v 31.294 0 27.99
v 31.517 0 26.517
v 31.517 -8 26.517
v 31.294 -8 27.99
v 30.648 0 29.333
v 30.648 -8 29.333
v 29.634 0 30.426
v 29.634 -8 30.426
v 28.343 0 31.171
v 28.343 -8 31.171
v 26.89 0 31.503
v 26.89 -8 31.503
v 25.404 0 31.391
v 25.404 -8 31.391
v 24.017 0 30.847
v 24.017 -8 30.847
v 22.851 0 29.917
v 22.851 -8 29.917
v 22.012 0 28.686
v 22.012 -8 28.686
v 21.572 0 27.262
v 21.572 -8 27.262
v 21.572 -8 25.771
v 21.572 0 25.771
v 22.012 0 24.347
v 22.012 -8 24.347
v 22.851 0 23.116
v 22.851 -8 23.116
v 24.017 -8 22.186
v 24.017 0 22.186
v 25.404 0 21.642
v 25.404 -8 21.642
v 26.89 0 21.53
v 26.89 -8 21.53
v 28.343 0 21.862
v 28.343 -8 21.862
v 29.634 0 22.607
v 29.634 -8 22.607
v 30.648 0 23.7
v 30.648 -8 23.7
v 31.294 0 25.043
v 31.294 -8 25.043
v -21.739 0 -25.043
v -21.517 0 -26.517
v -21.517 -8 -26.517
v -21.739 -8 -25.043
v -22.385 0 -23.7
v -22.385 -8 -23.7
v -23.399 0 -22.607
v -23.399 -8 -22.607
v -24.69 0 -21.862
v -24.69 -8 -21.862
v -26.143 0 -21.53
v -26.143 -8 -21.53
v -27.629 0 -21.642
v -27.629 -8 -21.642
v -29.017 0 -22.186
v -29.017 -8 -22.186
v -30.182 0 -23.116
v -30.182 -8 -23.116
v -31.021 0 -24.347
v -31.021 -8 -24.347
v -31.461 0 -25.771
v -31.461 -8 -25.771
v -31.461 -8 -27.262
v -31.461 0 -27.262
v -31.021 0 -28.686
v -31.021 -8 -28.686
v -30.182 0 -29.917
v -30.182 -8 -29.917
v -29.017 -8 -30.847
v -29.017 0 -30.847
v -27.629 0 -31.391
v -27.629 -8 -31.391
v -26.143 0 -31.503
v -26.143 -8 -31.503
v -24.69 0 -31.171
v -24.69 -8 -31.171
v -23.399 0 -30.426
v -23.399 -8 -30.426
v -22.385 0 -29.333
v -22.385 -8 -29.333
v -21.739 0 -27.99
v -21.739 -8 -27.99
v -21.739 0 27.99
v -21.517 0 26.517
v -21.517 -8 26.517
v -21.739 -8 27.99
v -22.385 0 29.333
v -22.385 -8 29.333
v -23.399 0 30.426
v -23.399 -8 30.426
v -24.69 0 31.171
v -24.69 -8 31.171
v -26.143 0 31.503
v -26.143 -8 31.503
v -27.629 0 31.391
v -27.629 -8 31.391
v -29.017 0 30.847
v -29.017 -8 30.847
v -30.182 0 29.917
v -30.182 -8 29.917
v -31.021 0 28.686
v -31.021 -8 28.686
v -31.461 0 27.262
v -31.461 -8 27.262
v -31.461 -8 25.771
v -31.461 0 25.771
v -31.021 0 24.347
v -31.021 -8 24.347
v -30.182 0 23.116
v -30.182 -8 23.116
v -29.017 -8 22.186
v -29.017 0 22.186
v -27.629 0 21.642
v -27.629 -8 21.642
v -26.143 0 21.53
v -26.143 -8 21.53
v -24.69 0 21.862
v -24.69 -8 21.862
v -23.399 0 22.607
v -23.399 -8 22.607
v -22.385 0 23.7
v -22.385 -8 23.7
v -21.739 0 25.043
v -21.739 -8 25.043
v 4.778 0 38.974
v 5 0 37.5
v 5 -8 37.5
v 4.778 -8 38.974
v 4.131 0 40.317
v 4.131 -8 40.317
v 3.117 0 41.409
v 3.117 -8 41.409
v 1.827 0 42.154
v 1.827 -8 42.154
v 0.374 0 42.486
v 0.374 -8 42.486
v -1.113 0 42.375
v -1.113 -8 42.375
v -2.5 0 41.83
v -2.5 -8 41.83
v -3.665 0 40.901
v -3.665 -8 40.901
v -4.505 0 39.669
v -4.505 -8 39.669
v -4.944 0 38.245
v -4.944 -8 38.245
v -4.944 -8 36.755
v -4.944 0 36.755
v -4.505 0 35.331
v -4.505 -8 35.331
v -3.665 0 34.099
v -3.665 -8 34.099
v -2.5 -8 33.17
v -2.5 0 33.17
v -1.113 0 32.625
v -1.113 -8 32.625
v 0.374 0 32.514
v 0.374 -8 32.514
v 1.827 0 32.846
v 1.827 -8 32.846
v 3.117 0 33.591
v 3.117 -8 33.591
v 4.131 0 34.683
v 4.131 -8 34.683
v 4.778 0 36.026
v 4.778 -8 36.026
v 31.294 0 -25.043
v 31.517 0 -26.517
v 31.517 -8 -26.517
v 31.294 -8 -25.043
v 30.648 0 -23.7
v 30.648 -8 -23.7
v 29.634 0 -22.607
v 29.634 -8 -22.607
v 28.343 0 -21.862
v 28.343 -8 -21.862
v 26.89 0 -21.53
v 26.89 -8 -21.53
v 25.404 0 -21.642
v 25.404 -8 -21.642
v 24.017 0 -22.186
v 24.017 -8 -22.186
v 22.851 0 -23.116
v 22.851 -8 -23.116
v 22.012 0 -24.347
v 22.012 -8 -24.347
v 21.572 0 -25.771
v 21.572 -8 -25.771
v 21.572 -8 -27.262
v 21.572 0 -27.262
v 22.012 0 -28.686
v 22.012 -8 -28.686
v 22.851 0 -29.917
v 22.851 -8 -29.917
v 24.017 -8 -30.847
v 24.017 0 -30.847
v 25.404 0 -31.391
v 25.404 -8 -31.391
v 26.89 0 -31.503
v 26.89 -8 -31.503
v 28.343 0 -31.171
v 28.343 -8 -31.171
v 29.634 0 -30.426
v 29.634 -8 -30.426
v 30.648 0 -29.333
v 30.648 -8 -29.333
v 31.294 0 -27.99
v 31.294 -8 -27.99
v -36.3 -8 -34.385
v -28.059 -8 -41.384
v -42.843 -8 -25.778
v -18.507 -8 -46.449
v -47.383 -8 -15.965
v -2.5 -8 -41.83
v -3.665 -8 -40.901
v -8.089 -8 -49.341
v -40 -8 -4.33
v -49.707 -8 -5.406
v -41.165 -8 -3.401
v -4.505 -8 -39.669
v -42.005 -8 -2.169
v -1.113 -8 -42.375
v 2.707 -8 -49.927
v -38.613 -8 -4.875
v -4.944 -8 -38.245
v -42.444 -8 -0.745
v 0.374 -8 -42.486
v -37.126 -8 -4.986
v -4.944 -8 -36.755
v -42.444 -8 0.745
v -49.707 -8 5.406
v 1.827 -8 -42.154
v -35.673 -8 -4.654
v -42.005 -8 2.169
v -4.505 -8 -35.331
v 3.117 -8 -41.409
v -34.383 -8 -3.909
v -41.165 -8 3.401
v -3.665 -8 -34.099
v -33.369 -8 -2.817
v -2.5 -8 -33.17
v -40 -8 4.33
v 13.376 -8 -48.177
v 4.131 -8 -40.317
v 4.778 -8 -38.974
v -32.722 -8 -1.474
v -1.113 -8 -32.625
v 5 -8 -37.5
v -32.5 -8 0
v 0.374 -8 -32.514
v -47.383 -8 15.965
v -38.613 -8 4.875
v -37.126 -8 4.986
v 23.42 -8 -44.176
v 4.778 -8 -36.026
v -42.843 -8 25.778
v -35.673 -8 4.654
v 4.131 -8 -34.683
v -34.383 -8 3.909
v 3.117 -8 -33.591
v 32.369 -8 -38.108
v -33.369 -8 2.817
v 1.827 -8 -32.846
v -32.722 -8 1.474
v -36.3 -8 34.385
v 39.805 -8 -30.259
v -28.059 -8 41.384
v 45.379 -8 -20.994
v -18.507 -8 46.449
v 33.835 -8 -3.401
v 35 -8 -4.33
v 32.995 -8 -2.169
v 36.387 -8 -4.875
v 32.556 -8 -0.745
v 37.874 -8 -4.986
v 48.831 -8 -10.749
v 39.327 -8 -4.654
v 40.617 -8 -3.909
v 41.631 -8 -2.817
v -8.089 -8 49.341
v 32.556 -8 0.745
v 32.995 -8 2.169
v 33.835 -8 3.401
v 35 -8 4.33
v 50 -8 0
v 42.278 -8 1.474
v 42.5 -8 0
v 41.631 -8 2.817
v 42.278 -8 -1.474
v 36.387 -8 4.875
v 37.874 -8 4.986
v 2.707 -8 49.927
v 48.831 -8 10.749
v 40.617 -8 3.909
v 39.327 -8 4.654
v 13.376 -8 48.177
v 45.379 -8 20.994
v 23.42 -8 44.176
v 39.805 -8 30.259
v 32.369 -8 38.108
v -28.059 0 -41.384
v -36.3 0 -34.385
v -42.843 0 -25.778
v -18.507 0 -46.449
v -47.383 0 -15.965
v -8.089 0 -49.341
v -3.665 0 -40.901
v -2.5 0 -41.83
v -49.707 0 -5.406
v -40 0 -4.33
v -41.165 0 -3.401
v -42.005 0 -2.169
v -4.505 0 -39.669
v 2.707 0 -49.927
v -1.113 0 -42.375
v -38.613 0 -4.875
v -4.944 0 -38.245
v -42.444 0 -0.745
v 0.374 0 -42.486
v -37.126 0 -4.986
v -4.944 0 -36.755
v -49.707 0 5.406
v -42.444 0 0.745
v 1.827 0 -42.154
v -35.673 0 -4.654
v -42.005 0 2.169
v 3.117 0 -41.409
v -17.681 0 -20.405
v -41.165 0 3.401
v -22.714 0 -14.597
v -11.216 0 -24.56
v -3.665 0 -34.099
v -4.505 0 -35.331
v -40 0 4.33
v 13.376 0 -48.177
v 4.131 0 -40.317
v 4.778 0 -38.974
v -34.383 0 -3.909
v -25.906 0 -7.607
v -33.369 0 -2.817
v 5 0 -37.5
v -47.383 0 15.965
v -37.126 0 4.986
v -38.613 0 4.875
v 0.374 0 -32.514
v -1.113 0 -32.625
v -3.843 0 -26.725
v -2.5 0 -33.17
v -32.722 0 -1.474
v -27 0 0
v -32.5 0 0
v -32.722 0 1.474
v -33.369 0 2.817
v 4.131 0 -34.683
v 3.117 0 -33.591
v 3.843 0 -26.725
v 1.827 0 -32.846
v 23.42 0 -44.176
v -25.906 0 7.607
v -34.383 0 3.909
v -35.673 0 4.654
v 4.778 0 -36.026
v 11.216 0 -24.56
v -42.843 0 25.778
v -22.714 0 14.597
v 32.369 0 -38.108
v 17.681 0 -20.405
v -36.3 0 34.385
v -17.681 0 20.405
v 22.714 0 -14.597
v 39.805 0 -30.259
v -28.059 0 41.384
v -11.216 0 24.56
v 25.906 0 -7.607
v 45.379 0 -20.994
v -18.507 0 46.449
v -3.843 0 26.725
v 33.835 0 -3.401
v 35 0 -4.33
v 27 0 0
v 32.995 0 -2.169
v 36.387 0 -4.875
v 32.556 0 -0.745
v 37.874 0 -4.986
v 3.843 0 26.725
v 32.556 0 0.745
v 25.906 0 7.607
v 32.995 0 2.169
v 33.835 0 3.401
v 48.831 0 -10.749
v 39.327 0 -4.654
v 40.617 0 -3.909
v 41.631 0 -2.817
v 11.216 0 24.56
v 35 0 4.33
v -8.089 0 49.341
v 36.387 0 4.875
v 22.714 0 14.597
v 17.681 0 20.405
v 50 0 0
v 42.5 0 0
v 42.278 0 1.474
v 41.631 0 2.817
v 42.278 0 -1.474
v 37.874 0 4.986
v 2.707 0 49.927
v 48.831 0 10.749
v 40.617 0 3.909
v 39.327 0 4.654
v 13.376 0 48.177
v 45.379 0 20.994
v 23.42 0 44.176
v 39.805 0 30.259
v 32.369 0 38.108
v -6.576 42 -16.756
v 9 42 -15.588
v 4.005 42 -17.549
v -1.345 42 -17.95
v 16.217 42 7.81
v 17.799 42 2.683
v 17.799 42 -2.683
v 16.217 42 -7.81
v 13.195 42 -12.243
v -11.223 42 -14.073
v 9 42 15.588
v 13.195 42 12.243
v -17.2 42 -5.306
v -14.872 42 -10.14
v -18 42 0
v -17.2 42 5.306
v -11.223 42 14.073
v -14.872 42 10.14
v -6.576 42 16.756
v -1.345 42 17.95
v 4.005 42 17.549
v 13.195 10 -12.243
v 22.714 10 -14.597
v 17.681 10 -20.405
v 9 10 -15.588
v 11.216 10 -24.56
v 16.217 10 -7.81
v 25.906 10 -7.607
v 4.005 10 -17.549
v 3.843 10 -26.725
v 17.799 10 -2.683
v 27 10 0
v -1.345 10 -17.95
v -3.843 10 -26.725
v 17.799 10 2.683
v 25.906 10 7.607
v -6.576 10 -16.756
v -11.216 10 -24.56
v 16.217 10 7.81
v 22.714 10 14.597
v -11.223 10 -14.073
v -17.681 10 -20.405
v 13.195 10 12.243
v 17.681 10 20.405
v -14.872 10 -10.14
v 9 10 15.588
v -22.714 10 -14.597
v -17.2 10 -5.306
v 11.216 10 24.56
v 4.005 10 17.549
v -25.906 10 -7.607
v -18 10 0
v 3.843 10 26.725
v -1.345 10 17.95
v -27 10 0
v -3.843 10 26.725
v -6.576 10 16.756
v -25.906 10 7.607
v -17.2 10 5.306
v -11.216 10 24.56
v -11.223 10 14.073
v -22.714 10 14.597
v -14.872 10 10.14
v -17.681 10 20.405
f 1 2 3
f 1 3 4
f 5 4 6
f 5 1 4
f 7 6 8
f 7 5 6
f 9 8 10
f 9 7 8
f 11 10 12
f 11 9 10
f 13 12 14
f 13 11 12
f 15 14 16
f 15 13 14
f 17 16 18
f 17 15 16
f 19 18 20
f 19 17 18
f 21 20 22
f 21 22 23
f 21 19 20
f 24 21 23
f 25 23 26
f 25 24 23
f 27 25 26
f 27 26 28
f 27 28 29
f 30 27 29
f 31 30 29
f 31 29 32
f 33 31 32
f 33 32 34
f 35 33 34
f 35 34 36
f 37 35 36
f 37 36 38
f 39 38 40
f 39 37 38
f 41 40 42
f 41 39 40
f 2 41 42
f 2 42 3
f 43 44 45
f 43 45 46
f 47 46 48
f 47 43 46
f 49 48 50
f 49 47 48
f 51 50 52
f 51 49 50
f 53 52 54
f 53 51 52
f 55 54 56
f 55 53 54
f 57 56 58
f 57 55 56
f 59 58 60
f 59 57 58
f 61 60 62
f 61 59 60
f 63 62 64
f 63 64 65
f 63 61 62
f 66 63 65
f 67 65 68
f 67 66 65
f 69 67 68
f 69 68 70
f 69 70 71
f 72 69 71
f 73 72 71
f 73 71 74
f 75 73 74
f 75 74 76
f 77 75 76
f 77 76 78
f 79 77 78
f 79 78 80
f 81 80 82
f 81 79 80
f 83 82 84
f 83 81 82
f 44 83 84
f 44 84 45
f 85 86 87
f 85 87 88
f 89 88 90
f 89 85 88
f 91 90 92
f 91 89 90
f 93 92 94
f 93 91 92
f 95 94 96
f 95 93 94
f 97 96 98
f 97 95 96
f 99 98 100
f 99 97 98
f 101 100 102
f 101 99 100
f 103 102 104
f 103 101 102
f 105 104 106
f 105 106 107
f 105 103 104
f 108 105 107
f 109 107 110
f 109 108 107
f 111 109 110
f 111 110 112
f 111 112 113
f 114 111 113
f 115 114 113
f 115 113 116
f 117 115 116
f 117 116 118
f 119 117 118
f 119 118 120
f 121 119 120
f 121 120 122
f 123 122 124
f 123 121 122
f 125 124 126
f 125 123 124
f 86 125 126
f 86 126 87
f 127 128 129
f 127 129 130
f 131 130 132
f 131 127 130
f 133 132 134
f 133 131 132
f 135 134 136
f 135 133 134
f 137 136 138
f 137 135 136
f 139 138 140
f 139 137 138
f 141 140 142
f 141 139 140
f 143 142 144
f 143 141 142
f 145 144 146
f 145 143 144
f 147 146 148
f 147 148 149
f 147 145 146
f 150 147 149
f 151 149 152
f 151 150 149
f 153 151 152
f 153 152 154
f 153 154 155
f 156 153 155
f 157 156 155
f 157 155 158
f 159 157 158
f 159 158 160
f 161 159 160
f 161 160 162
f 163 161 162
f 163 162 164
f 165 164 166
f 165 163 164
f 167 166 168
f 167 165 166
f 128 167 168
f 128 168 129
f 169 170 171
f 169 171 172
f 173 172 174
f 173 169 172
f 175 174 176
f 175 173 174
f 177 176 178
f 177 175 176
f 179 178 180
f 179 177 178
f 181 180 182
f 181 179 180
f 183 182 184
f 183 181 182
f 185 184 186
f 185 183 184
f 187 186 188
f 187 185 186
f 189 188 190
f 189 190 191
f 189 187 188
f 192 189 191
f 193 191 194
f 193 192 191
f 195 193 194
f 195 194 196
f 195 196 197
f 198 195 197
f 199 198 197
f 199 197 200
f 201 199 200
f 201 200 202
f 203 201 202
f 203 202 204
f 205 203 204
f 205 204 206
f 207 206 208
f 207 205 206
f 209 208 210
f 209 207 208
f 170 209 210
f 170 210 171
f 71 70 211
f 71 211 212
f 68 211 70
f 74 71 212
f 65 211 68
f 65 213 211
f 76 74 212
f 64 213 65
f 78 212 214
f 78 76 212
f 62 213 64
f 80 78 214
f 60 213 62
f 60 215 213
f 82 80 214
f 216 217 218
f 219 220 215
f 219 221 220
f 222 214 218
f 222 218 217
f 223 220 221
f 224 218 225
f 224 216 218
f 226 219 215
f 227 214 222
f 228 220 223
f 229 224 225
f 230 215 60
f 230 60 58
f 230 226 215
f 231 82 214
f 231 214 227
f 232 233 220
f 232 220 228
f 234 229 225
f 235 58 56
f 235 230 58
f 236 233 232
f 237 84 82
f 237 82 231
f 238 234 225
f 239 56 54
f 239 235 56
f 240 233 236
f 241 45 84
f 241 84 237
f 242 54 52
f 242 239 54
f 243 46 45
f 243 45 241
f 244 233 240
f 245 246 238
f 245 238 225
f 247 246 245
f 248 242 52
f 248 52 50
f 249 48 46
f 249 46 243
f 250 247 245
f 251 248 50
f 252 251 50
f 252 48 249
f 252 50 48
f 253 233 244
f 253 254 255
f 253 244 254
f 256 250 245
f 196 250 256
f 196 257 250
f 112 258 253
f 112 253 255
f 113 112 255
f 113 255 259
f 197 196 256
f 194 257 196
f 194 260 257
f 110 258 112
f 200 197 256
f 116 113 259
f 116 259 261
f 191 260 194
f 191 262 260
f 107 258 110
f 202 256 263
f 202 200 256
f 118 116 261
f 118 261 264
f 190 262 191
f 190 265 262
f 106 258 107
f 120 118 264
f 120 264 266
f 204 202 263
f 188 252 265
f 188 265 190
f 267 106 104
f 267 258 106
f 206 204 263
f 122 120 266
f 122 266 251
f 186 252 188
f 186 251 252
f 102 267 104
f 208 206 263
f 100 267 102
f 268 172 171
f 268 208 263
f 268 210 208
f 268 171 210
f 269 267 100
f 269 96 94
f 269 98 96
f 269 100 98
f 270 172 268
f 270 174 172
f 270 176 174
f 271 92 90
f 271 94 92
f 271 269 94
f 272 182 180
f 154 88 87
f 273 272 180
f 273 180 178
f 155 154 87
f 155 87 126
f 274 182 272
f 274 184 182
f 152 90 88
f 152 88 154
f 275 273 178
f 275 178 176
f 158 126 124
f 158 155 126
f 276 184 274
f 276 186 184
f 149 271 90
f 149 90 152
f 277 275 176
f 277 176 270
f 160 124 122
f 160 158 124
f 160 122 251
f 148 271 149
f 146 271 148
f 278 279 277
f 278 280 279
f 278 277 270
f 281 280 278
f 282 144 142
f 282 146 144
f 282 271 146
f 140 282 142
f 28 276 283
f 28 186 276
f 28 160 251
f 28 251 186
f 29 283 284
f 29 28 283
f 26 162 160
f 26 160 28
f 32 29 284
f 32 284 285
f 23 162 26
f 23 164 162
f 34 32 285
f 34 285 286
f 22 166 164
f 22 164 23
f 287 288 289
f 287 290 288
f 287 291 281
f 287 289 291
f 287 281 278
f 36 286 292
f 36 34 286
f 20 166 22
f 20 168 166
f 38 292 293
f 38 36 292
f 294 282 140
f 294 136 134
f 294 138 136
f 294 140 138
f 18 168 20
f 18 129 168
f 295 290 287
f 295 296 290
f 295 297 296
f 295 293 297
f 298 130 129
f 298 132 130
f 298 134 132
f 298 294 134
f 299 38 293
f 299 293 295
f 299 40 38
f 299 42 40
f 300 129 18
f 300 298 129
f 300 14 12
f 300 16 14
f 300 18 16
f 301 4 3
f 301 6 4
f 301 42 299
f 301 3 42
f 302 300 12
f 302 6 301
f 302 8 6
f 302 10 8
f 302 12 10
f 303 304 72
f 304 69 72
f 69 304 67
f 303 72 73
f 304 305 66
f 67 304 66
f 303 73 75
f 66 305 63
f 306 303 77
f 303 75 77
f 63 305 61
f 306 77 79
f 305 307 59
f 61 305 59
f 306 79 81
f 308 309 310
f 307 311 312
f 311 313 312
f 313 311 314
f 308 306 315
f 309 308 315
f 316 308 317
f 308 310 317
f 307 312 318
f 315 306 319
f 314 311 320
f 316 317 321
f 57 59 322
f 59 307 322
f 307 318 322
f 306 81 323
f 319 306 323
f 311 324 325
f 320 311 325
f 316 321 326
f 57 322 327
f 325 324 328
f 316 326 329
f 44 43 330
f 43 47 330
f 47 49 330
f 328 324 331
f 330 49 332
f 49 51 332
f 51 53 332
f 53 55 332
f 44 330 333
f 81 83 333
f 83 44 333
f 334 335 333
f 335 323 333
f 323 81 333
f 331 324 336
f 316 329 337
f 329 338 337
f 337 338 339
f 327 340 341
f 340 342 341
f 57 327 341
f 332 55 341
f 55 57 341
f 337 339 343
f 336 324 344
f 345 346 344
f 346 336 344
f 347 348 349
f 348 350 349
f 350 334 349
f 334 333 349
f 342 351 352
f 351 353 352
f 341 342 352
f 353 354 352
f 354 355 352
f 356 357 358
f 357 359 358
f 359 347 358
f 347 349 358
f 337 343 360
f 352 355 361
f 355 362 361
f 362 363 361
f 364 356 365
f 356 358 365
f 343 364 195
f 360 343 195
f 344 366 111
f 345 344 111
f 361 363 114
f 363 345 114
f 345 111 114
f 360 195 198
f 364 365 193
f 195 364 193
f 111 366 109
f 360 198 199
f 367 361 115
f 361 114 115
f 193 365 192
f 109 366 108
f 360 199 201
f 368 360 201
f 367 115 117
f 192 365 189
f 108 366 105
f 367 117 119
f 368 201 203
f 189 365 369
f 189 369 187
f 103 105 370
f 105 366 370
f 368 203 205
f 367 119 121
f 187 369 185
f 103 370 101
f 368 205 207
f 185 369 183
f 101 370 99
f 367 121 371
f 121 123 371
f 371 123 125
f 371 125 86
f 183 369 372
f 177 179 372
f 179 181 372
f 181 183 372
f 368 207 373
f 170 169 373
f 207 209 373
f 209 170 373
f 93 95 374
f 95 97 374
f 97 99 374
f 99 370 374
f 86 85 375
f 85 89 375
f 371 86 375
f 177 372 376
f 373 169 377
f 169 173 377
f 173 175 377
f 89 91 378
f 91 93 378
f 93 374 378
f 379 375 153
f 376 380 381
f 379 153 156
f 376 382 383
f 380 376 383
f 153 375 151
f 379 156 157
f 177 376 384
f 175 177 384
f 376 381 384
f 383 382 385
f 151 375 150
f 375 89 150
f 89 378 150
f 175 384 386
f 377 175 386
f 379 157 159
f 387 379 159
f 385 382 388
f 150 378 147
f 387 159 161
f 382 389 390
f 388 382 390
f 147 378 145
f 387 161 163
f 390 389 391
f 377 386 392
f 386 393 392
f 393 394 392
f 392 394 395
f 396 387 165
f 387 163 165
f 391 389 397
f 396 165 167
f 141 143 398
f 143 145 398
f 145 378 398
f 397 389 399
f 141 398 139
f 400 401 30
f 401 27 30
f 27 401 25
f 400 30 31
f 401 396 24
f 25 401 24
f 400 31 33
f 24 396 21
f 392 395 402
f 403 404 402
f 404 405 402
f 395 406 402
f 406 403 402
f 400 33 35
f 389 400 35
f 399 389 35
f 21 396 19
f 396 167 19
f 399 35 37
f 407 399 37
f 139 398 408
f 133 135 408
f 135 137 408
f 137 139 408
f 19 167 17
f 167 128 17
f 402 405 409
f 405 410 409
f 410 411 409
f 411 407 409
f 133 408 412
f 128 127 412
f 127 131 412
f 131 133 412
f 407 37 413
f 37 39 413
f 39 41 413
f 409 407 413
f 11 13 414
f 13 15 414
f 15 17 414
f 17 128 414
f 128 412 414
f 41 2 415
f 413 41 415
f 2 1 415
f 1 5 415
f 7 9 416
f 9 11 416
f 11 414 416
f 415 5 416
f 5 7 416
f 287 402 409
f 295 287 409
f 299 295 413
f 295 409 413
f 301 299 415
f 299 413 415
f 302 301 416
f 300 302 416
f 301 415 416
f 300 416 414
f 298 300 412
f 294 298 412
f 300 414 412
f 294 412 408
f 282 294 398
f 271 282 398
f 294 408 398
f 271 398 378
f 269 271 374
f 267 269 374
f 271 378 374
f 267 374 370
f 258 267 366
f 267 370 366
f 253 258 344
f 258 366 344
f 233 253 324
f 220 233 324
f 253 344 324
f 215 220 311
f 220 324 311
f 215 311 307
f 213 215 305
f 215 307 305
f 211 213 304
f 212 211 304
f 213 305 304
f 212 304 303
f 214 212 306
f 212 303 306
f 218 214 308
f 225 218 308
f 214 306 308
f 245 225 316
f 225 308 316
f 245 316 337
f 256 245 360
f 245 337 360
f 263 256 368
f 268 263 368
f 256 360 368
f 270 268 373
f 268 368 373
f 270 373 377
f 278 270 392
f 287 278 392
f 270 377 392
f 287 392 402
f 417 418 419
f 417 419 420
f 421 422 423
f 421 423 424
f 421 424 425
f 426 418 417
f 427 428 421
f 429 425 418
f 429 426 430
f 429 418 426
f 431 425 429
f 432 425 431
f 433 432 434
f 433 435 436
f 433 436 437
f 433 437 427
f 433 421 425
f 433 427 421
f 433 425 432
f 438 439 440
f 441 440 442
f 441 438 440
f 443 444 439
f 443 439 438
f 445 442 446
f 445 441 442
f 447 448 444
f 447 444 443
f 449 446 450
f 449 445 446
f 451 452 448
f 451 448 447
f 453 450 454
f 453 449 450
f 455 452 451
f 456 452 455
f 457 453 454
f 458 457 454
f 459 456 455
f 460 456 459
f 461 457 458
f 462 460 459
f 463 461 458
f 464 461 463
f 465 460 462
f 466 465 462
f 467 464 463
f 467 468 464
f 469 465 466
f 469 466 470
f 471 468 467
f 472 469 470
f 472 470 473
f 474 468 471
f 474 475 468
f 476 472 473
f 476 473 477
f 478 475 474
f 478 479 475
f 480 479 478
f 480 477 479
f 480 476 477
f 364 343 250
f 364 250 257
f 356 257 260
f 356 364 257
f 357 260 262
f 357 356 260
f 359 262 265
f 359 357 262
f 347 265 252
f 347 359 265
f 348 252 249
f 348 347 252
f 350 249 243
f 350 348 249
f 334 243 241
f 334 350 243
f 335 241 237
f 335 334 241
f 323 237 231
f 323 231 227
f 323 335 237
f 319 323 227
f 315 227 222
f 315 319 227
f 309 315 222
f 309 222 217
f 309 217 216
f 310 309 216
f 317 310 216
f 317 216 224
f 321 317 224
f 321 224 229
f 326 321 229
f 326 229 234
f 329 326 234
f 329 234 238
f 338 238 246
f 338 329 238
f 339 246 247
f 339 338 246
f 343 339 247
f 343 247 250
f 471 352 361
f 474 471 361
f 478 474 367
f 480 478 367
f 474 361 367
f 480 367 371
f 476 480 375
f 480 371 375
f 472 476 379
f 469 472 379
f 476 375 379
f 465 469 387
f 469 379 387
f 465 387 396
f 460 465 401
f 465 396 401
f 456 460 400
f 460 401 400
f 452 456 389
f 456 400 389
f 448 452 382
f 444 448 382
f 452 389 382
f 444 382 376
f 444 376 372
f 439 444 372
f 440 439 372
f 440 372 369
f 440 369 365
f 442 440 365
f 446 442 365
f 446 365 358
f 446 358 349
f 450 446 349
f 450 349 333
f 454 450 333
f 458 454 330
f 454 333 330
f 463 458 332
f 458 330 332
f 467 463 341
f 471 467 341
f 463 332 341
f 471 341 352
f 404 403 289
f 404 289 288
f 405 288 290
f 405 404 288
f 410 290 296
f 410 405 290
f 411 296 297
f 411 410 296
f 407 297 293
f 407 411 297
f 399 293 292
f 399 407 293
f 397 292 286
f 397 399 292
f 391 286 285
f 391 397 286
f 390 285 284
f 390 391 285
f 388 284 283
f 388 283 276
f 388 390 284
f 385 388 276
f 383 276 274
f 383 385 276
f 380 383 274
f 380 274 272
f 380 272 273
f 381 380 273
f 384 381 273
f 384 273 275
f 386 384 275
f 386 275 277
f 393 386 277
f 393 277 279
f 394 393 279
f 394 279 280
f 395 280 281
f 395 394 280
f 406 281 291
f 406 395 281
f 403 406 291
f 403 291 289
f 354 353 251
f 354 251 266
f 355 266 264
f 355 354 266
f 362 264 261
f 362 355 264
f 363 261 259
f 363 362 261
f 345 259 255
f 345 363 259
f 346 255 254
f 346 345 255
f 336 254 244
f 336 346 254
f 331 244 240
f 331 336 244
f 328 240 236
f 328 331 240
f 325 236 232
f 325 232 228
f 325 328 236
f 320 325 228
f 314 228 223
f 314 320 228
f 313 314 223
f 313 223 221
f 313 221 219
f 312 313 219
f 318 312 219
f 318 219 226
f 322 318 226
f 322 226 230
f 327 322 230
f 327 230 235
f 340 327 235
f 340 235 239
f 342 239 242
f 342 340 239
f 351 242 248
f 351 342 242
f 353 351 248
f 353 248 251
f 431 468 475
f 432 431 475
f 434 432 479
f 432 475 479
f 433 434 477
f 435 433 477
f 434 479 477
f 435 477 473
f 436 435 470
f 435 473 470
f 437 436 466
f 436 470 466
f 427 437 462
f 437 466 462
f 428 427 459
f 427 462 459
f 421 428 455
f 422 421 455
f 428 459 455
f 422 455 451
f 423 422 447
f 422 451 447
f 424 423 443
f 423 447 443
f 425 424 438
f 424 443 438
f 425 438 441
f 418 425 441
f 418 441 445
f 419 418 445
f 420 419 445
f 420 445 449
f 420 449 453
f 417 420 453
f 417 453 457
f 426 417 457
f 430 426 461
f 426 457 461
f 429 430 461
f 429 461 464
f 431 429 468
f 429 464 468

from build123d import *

# Parameters (mm, degrees)
F0_R     = 50
F0_R_2   = 5
F1_DEPTH = 8
F2_R     = 27
F3_DEPTH = 10
F4_R     = 18
F5_DEPTH = 32


with BuildPart() as f1:
    # F0 (on Front) → F1 (new body)
    with BuildSketch(Plane.XZ):
        Circle(F0_R)
        with Locations((-26.516504, -26.516504)):
            Circle(F0_R_2, mode=Mode.SUBTRACT)
        with Locations((0, -37.5)):
            Circle(F0_R_2, mode=Mode.SUBTRACT)
        with Locations((26.516504, -26.516504)):
            Circle(F0_R_2, mode=Mode.SUBTRACT)
        with Locations((-37.5, 0)):
            Circle(F0_R_2, mode=Mode.SUBTRACT)
        with Locations((-26.516504, 26.516504)):
            Circle(F0_R_2, mode=Mode.SUBTRACT)
        with Locations((37.5, 0)):
            Circle(F0_R_2, mode=Mode.SUBTRACT)
        with Locations((0, 37.5)):
            Circle(F0_R_2, mode=Mode.SUBTRACT)
        with Locations((26.516504, 26.516504)):
            Circle(F0_R_2, mode=Mode.SUBTRACT)
    extrude(amount=F1_DEPTH)

    # F2 (on face) → F3 (join)
    with BuildSketch(Plane(origin=(0, 0, 0), x_dir=(-1, 0, 0), z_dir=(0, 1, 0))):
        Circle(F2_R)
    extrude(amount=F3_DEPTH)

    # F4 (on face) → F5 (join)
    with BuildSketch(Plane(origin=(0, 10, 0), x_dir=(-1, 0, 0), z_dir=(0, 1, 0))):
        Circle(F4_R)
    extrude(amount=F5_DEPTH)


solid = f1.part
